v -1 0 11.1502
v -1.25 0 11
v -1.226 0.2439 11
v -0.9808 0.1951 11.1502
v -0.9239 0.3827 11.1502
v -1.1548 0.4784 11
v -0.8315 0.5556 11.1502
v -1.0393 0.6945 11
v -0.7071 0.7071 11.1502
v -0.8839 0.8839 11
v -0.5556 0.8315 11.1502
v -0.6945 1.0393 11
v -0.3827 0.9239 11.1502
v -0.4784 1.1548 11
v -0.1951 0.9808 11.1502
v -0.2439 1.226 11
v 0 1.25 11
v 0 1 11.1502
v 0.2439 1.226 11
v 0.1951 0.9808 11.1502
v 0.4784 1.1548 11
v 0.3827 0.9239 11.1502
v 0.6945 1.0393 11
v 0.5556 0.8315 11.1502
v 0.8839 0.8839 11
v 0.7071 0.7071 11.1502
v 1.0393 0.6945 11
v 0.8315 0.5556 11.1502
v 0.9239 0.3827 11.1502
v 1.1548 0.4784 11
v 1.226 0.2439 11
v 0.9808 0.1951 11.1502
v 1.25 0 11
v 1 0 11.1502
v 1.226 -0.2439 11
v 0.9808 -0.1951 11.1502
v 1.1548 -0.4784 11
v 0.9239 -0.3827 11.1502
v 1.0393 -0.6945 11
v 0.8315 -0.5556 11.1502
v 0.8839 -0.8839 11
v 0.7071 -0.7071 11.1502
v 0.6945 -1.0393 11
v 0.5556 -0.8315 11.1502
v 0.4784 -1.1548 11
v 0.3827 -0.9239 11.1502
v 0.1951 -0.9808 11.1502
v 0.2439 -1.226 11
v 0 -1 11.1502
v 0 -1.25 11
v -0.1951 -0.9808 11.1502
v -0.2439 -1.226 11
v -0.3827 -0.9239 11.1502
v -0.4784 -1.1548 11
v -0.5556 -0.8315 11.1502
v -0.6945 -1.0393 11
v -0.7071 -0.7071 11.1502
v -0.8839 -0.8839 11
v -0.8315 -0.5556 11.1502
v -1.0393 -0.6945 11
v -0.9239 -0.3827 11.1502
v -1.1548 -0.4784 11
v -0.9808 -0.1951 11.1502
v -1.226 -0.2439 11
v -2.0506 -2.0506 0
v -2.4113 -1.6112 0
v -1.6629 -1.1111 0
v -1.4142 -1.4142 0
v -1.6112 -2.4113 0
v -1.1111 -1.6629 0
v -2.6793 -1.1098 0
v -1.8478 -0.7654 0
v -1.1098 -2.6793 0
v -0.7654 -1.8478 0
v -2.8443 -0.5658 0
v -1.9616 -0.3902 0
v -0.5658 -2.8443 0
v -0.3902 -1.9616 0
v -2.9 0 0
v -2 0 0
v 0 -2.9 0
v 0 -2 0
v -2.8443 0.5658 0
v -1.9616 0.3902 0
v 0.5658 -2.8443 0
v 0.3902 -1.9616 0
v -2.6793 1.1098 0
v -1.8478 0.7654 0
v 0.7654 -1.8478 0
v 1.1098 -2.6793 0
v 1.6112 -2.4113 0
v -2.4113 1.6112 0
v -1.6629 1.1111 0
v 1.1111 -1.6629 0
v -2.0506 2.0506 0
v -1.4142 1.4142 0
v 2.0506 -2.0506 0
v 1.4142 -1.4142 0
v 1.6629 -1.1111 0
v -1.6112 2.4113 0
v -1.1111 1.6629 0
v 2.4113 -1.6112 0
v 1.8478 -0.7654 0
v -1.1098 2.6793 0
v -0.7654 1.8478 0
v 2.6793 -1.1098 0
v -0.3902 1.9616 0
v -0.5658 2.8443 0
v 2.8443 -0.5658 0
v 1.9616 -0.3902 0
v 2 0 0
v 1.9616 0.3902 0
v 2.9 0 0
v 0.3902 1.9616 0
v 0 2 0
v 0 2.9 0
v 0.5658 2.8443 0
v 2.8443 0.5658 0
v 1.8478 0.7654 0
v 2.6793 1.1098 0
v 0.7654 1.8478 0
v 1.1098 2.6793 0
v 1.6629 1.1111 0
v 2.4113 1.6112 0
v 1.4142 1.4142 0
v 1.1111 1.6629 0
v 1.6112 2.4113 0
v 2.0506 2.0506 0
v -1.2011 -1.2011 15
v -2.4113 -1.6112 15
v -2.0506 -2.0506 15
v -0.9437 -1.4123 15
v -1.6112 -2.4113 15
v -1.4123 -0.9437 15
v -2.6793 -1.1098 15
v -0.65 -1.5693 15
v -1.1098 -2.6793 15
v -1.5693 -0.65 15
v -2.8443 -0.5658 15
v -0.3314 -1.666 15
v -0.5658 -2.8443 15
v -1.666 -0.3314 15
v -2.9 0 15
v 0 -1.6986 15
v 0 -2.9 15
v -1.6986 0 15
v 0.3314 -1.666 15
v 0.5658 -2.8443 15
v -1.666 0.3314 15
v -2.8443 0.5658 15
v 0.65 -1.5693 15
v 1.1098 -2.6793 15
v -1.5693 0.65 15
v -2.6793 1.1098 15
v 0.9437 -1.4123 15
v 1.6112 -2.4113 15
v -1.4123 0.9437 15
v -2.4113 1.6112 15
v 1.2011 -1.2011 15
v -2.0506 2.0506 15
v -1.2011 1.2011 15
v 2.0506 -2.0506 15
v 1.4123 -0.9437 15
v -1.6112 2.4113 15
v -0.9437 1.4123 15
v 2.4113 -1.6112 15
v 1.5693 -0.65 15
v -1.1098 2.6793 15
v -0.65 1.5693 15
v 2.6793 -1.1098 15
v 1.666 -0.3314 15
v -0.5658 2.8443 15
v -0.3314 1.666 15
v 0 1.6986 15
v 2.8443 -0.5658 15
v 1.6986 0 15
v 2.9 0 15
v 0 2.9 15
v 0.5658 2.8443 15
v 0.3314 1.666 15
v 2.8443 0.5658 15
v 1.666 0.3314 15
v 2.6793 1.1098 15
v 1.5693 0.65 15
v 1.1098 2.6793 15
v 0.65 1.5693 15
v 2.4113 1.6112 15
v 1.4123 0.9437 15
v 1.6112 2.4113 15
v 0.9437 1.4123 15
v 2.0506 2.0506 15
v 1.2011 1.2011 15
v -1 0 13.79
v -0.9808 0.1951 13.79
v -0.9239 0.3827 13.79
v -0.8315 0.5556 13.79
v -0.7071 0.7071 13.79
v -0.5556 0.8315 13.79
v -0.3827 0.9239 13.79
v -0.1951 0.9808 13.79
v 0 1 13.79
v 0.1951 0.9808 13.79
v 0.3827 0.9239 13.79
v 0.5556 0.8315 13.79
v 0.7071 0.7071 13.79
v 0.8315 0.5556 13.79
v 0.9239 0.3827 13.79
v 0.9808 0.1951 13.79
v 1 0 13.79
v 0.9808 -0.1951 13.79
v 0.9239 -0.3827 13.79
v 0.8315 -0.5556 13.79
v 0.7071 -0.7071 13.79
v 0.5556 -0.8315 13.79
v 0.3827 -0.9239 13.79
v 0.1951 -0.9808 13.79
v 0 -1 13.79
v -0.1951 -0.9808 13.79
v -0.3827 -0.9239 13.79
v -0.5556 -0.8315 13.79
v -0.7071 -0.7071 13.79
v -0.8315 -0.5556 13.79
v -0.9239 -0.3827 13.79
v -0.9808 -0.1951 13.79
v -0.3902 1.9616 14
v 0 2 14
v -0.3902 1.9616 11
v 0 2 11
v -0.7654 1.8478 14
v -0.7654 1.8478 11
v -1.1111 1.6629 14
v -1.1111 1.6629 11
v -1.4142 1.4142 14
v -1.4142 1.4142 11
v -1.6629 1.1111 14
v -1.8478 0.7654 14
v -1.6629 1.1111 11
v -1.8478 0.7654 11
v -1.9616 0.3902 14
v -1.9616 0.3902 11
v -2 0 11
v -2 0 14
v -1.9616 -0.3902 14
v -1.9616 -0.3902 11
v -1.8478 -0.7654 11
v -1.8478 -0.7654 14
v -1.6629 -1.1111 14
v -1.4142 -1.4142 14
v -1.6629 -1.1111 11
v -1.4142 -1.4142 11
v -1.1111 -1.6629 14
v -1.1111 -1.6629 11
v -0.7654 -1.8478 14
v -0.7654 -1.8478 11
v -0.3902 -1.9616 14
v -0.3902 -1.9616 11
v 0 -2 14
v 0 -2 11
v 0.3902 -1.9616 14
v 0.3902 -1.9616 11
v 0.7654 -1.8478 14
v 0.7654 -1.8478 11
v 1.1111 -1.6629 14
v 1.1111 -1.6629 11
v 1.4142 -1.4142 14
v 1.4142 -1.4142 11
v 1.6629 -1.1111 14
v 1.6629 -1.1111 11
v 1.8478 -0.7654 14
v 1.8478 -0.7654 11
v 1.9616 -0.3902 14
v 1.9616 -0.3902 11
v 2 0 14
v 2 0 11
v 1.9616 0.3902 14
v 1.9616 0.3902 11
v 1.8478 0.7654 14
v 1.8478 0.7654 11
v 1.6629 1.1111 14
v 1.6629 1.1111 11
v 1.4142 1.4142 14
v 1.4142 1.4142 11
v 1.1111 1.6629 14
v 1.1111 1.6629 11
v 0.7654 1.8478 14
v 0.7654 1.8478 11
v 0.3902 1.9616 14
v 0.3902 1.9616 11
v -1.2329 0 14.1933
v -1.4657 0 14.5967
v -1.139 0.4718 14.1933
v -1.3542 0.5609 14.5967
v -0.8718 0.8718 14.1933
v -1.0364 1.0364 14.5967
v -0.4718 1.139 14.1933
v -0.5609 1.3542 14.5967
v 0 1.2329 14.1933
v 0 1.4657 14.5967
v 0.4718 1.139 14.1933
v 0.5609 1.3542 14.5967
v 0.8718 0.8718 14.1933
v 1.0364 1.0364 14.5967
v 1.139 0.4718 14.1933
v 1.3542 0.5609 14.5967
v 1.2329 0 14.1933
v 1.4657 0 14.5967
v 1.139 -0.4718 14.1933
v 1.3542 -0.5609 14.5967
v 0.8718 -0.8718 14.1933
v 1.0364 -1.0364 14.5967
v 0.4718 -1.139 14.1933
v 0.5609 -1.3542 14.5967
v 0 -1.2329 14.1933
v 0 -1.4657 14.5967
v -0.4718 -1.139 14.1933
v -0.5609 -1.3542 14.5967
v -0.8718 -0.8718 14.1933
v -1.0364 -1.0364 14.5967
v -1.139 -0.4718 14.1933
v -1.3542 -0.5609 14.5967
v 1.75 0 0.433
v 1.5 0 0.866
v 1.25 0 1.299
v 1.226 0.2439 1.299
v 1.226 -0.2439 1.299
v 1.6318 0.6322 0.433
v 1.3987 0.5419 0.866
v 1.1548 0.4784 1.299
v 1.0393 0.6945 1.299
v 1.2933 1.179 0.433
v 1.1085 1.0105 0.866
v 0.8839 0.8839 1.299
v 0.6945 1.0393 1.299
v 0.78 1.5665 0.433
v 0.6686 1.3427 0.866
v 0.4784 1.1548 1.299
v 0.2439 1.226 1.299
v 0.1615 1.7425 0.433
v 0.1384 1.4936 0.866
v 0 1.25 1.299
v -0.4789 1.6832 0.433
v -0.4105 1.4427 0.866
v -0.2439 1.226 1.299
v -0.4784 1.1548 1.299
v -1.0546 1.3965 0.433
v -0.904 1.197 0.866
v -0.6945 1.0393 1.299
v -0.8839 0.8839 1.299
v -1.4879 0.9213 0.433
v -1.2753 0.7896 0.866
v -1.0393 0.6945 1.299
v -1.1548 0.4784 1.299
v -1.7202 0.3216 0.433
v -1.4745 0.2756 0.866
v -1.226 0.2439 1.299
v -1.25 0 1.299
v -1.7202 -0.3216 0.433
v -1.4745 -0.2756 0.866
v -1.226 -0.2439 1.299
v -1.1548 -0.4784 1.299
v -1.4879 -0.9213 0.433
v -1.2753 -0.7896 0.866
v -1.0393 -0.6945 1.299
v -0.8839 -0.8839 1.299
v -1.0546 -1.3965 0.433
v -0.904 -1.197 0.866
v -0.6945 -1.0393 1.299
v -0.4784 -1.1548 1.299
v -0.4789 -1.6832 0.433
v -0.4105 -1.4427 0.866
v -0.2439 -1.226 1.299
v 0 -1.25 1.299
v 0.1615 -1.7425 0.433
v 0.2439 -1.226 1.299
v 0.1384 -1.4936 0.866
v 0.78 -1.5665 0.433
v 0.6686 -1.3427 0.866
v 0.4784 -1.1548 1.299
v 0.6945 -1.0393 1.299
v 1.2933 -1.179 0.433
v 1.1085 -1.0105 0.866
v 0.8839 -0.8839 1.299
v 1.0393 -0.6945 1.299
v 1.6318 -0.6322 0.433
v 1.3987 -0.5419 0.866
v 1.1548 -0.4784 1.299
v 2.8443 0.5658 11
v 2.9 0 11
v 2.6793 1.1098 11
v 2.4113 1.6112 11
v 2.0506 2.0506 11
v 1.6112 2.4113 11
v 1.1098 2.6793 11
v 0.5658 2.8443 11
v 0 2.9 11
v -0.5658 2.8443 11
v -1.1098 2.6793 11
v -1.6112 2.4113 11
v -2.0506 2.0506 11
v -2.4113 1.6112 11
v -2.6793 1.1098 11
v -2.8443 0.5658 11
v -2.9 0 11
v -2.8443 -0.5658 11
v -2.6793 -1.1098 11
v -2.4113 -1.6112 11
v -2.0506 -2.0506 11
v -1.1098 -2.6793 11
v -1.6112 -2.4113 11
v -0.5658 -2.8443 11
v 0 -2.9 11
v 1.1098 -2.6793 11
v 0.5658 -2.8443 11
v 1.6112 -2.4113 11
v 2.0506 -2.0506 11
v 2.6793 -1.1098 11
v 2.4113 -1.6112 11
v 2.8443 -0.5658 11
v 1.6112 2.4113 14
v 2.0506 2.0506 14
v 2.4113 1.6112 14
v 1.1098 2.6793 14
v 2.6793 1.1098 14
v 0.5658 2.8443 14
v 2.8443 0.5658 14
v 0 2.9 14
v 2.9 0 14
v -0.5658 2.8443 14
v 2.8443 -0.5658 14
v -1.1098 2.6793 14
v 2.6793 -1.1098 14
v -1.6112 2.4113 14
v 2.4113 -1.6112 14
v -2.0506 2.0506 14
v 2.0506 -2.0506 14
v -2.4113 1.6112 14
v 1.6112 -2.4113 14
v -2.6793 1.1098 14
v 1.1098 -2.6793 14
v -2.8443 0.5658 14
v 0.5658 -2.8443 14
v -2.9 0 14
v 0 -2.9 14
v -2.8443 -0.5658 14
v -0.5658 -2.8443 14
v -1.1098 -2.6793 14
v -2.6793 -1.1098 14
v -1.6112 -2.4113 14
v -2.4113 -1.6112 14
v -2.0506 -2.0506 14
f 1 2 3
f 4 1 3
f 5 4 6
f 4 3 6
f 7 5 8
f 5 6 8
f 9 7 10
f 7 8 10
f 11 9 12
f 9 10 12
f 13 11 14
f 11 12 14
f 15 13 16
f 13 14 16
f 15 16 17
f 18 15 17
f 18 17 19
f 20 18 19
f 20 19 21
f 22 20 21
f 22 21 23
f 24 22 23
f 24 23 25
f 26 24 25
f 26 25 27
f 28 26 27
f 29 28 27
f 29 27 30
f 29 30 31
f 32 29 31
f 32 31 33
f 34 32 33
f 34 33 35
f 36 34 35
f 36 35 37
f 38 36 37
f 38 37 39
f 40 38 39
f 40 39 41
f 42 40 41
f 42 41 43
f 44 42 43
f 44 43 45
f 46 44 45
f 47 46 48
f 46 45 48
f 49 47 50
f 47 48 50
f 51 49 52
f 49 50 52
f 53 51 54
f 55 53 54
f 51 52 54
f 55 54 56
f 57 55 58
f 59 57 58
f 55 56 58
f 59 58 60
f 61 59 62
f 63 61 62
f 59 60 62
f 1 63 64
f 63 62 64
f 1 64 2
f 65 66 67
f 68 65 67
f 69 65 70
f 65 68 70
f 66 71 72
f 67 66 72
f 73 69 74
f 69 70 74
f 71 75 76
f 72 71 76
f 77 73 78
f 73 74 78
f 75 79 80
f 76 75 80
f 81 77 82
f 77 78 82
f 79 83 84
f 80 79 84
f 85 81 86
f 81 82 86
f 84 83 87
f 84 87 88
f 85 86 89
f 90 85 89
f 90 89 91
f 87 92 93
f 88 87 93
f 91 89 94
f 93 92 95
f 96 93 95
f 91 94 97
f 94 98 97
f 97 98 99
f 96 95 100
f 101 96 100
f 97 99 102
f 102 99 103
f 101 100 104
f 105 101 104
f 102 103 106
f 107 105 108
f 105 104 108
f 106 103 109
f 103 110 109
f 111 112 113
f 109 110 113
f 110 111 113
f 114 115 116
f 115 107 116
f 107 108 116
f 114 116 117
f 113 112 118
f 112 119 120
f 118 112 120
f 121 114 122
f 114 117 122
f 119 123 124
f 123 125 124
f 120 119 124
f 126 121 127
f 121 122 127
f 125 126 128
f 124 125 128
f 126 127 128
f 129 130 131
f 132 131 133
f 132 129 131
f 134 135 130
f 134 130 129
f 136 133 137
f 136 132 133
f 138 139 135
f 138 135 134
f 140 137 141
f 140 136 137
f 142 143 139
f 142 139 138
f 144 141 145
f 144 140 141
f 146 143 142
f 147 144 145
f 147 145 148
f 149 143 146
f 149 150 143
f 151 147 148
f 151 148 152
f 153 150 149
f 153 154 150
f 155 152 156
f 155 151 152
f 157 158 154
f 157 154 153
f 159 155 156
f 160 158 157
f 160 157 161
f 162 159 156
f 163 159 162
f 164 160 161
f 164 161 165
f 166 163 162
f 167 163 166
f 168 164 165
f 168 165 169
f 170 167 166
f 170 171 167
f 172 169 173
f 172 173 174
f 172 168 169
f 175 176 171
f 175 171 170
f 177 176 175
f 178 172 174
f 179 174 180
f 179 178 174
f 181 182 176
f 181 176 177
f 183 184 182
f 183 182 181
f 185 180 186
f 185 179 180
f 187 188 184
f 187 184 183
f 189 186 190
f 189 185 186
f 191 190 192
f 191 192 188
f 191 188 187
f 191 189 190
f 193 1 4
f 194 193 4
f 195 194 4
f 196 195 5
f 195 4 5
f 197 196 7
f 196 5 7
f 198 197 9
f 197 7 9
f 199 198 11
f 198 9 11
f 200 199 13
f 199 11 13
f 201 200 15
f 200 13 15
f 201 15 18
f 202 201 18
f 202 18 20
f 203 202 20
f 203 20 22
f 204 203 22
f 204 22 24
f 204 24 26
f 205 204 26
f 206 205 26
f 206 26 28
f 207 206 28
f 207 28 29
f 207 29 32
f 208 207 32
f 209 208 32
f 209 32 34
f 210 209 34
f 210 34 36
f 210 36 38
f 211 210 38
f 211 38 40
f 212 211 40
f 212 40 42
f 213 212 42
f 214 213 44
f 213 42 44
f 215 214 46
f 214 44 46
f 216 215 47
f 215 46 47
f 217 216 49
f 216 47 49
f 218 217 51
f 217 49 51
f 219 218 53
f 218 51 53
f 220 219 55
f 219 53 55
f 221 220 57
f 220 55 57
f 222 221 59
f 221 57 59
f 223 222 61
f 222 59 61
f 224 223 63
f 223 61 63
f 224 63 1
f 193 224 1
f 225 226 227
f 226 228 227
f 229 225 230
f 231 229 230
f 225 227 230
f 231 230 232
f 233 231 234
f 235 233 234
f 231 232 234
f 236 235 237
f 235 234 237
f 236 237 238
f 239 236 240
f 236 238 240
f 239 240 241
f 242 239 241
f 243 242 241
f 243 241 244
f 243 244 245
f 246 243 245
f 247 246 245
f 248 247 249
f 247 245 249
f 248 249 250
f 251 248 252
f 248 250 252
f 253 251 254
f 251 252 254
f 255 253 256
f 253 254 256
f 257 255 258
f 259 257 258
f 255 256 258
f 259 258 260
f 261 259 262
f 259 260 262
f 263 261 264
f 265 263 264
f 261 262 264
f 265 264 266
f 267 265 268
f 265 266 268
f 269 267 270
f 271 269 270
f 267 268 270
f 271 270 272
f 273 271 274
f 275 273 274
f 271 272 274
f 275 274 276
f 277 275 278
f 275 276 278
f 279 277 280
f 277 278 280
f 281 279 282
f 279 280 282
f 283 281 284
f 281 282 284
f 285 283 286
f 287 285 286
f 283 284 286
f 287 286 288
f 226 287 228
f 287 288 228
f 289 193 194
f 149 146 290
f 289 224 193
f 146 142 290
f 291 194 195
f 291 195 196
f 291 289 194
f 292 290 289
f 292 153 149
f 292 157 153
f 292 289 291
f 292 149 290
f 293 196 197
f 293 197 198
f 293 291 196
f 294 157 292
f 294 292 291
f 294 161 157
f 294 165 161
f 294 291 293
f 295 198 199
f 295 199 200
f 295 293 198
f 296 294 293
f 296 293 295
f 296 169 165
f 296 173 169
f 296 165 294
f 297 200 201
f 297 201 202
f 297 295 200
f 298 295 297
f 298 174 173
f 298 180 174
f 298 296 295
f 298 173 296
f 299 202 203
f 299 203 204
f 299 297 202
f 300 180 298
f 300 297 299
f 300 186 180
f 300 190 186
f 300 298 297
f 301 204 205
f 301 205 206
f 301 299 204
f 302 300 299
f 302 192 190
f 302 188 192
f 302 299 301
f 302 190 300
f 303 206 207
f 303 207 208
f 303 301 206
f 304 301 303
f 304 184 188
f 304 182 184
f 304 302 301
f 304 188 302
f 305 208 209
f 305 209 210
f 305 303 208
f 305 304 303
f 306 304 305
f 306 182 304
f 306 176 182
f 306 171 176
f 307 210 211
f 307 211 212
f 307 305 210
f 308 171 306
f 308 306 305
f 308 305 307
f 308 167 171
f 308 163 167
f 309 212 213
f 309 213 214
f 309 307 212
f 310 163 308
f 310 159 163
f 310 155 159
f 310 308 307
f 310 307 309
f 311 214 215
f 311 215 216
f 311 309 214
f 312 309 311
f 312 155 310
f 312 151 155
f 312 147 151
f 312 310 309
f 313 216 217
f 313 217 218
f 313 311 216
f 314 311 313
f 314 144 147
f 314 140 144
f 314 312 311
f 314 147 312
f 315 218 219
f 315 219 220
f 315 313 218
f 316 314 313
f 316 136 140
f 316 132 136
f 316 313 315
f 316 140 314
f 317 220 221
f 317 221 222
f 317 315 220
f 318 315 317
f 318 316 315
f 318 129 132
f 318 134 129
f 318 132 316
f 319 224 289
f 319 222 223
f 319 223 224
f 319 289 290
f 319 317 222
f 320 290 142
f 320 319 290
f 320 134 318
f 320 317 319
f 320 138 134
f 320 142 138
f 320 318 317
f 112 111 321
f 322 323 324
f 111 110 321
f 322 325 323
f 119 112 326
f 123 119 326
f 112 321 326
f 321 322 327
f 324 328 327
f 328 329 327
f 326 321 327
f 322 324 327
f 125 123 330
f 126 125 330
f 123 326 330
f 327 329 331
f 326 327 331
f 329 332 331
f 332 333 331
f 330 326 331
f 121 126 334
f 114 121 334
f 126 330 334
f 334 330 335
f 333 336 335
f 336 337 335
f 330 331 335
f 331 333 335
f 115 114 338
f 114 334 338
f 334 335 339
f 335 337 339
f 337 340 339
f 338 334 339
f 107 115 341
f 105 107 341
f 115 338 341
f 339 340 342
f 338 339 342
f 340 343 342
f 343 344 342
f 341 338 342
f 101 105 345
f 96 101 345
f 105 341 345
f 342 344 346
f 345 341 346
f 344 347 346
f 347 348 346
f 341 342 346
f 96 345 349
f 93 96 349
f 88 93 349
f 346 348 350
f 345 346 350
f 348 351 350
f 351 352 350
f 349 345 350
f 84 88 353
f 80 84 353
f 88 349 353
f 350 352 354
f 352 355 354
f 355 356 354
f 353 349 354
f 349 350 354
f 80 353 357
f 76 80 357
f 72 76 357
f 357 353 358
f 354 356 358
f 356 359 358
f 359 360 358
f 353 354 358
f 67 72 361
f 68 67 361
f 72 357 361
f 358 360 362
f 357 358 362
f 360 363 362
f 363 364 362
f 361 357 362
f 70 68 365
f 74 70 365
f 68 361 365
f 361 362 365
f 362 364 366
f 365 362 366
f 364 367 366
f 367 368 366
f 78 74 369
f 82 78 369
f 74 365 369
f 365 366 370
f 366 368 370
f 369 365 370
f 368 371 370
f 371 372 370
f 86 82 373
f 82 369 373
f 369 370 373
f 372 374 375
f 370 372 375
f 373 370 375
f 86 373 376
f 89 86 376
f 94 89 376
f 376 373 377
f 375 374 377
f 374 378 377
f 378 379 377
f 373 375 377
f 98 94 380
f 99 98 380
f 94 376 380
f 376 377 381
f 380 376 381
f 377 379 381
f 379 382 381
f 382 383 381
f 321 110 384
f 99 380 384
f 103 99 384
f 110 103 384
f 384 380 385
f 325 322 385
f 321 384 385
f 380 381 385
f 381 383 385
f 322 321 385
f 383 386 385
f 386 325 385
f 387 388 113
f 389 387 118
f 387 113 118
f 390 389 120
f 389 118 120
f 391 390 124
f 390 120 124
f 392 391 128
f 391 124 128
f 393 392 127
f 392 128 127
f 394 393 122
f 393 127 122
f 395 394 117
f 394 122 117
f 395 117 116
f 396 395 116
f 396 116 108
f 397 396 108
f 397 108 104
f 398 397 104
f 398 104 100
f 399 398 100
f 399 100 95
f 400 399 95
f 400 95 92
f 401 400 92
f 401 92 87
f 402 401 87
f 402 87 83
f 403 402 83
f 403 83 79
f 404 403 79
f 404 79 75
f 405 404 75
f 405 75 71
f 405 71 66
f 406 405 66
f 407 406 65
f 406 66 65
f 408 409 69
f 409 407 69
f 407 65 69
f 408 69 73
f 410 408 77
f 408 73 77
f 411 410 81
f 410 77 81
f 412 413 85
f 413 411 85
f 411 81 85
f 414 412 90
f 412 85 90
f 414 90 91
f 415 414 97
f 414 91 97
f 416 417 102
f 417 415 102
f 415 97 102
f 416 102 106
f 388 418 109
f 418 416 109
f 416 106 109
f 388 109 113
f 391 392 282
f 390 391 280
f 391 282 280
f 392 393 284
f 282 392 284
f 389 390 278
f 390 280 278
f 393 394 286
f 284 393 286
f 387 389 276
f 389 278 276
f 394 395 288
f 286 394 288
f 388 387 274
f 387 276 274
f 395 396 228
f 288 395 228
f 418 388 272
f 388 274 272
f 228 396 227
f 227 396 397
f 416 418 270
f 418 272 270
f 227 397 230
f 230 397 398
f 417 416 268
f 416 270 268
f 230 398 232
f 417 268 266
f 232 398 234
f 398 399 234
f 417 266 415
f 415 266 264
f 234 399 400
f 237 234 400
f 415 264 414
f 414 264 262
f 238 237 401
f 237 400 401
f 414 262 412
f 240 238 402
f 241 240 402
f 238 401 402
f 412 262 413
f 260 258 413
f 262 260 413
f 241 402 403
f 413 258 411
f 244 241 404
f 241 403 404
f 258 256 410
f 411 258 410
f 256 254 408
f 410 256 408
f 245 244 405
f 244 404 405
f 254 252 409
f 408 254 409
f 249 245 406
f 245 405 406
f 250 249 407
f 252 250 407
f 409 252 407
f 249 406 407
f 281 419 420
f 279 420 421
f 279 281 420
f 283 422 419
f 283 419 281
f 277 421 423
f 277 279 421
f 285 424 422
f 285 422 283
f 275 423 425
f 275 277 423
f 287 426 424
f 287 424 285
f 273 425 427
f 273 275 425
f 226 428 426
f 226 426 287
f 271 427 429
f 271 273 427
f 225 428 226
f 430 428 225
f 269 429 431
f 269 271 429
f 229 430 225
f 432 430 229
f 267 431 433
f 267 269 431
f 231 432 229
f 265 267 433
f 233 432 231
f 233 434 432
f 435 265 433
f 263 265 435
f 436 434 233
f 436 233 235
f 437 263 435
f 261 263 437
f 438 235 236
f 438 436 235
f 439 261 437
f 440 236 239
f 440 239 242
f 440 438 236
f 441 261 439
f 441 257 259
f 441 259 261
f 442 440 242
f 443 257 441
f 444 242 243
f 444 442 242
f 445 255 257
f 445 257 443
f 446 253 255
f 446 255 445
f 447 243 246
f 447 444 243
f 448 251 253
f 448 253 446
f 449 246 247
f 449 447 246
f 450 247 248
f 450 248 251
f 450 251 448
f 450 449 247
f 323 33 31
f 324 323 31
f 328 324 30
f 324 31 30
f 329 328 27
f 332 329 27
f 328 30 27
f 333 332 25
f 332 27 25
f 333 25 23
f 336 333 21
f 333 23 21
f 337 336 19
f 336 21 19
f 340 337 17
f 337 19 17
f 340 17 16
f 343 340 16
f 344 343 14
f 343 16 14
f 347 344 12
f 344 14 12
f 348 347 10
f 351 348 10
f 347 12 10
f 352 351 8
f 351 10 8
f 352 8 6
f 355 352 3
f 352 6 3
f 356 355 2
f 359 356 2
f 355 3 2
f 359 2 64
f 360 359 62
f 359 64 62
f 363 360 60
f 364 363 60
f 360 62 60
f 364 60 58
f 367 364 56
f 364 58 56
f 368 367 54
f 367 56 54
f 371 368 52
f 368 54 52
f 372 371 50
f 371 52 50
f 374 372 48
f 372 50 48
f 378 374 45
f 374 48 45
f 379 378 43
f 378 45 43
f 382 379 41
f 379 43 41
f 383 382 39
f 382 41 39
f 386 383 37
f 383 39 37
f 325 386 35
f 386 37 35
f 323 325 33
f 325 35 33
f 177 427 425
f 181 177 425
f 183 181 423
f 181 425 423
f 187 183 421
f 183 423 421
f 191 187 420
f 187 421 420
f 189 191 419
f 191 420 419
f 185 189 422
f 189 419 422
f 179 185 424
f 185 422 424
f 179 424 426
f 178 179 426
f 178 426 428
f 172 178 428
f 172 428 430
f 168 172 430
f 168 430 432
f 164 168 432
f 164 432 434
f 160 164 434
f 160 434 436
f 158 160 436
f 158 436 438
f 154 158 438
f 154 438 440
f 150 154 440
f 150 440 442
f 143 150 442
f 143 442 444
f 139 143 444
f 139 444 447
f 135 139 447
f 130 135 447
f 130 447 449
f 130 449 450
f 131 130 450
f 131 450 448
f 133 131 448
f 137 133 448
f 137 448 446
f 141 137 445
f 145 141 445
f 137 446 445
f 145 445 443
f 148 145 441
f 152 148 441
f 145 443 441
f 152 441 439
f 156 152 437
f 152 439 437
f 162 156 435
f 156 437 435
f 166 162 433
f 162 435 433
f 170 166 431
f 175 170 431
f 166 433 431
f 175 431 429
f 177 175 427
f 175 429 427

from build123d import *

# Parameters (mm, degrees)
SKETCH1_R                       = 2.9
BOSS_EXTRUDE1_DEPTH             = 15
SKETCH2_R                       = 1
CUT_EXTRUDE1_DEPTH              = 16
TAP_DRILL_FOR_M3X0_5_TAP1_D     = 2.5
TAP_DRILL_FOR_M3X0_5_TAP1_DEPTH = 11
TAP_DRILL_FOR_M3X0_5_TAP1_TIP   = 0.751075774
SKETCH5_W                       = 3
SKETCH5_H                       = 1.793791595
CHAMFER1_SIZE                   = 0.75
CHAMFER1_SIZE2                  = 1.299038106
CHAMFER2_SIZE                   = 1.21
CHAMFER2_SIZE2                  = 0.698593826


with BuildPart() as part:
    # Sketch1 → Boss-Extrude1 (new body)
    with BuildSketch(Plane.XY):
        Circle(SKETCH1_R)
    extrude(amount=BOSS_EXTRUDE1_DEPTH)

    # Sketch2 → Cut-Extrude1 (cut, through all)
    with BuildSketch(Plane(origin=(0, 0, 0), x_dir=(-1, 0, 0), z_dir=(0, 0, -1))):
        Circle(SKETCH2_R)
    extrude(amount=-CUT_EXTRUDE1_DEPTH, mode=Mode.SUBTRACT)

    # Tap Drill for M3x0.5 Tap1
    with Locations(Plane(origin=(0, 0, 0), x_dir=(-1, 0, 0), z_dir=(0, 0, -1))):
        with Locations((0, 0)):
            Hole(TAP_DRILL_FOR_M3X0_5_TAP1_D / 2, depth=TAP_DRILL_FOR_M3X0_5_TAP1_DEPTH)
            with Locations((0, 0, -(TAP_DRILL_FOR_M3X0_5_TAP1_DEPTH + TAP_DRILL_FOR_M3X0_5_TAP1_TIP / 2))):  # 118° drill point
                Cone(0, TAP_DRILL_FOR_M3X0_5_TAP1_D / 2, TAP_DRILL_FOR_M3X0_5_TAP1_TIP, mode=Mode.SUBTRACT)

    # Sketch5 → Cut-Revolve1 (revolve, cut)
    with BuildSketch(Plane(origin=(0, 0, 0), x_dir=(0, 0, -1), z_dir=(1, 0, 0))):
        with Locations((-12.5, 2.896895798)):
            Rectangle(SKETCH5_W, SKETCH5_H)
    revolve(axis=Axis((0, 0, 0), (0, 0, 1)), mode=Mode.SUBTRACT)

    # Chamfer1
    chamfer1_edges = [part.edges().sort_by_distance(p)[0] for p in [
        (-1.25, 0, 0),
    ]]
    chamfer1_side = [part.faces().sort_by_distance(p)[0] for p in [
        (-2.817975613, 0, 0),
    ]]
    chamfer(chamfer1_edges, length=CHAMFER1_SIZE, length2=CHAMFER1_SIZE2, reference=chamfer1_side[0])

    # Chamfer2
    chamfer2_edges = [part.edges().sort_by_distance(p)[0] for p in [
        (1, 0, 15),
    ]]
    chamfer2_side = [part.faces().sort_by_distance(p)[0] for p in [
        (1, 0, 13.075107577),
    ]]
    chamfer(chamfer2_edges, length=CHAMFER2_SIZE, length2=CHAMFER2_SIZE2, reference=chamfer2_side[0])


solid = part.part
